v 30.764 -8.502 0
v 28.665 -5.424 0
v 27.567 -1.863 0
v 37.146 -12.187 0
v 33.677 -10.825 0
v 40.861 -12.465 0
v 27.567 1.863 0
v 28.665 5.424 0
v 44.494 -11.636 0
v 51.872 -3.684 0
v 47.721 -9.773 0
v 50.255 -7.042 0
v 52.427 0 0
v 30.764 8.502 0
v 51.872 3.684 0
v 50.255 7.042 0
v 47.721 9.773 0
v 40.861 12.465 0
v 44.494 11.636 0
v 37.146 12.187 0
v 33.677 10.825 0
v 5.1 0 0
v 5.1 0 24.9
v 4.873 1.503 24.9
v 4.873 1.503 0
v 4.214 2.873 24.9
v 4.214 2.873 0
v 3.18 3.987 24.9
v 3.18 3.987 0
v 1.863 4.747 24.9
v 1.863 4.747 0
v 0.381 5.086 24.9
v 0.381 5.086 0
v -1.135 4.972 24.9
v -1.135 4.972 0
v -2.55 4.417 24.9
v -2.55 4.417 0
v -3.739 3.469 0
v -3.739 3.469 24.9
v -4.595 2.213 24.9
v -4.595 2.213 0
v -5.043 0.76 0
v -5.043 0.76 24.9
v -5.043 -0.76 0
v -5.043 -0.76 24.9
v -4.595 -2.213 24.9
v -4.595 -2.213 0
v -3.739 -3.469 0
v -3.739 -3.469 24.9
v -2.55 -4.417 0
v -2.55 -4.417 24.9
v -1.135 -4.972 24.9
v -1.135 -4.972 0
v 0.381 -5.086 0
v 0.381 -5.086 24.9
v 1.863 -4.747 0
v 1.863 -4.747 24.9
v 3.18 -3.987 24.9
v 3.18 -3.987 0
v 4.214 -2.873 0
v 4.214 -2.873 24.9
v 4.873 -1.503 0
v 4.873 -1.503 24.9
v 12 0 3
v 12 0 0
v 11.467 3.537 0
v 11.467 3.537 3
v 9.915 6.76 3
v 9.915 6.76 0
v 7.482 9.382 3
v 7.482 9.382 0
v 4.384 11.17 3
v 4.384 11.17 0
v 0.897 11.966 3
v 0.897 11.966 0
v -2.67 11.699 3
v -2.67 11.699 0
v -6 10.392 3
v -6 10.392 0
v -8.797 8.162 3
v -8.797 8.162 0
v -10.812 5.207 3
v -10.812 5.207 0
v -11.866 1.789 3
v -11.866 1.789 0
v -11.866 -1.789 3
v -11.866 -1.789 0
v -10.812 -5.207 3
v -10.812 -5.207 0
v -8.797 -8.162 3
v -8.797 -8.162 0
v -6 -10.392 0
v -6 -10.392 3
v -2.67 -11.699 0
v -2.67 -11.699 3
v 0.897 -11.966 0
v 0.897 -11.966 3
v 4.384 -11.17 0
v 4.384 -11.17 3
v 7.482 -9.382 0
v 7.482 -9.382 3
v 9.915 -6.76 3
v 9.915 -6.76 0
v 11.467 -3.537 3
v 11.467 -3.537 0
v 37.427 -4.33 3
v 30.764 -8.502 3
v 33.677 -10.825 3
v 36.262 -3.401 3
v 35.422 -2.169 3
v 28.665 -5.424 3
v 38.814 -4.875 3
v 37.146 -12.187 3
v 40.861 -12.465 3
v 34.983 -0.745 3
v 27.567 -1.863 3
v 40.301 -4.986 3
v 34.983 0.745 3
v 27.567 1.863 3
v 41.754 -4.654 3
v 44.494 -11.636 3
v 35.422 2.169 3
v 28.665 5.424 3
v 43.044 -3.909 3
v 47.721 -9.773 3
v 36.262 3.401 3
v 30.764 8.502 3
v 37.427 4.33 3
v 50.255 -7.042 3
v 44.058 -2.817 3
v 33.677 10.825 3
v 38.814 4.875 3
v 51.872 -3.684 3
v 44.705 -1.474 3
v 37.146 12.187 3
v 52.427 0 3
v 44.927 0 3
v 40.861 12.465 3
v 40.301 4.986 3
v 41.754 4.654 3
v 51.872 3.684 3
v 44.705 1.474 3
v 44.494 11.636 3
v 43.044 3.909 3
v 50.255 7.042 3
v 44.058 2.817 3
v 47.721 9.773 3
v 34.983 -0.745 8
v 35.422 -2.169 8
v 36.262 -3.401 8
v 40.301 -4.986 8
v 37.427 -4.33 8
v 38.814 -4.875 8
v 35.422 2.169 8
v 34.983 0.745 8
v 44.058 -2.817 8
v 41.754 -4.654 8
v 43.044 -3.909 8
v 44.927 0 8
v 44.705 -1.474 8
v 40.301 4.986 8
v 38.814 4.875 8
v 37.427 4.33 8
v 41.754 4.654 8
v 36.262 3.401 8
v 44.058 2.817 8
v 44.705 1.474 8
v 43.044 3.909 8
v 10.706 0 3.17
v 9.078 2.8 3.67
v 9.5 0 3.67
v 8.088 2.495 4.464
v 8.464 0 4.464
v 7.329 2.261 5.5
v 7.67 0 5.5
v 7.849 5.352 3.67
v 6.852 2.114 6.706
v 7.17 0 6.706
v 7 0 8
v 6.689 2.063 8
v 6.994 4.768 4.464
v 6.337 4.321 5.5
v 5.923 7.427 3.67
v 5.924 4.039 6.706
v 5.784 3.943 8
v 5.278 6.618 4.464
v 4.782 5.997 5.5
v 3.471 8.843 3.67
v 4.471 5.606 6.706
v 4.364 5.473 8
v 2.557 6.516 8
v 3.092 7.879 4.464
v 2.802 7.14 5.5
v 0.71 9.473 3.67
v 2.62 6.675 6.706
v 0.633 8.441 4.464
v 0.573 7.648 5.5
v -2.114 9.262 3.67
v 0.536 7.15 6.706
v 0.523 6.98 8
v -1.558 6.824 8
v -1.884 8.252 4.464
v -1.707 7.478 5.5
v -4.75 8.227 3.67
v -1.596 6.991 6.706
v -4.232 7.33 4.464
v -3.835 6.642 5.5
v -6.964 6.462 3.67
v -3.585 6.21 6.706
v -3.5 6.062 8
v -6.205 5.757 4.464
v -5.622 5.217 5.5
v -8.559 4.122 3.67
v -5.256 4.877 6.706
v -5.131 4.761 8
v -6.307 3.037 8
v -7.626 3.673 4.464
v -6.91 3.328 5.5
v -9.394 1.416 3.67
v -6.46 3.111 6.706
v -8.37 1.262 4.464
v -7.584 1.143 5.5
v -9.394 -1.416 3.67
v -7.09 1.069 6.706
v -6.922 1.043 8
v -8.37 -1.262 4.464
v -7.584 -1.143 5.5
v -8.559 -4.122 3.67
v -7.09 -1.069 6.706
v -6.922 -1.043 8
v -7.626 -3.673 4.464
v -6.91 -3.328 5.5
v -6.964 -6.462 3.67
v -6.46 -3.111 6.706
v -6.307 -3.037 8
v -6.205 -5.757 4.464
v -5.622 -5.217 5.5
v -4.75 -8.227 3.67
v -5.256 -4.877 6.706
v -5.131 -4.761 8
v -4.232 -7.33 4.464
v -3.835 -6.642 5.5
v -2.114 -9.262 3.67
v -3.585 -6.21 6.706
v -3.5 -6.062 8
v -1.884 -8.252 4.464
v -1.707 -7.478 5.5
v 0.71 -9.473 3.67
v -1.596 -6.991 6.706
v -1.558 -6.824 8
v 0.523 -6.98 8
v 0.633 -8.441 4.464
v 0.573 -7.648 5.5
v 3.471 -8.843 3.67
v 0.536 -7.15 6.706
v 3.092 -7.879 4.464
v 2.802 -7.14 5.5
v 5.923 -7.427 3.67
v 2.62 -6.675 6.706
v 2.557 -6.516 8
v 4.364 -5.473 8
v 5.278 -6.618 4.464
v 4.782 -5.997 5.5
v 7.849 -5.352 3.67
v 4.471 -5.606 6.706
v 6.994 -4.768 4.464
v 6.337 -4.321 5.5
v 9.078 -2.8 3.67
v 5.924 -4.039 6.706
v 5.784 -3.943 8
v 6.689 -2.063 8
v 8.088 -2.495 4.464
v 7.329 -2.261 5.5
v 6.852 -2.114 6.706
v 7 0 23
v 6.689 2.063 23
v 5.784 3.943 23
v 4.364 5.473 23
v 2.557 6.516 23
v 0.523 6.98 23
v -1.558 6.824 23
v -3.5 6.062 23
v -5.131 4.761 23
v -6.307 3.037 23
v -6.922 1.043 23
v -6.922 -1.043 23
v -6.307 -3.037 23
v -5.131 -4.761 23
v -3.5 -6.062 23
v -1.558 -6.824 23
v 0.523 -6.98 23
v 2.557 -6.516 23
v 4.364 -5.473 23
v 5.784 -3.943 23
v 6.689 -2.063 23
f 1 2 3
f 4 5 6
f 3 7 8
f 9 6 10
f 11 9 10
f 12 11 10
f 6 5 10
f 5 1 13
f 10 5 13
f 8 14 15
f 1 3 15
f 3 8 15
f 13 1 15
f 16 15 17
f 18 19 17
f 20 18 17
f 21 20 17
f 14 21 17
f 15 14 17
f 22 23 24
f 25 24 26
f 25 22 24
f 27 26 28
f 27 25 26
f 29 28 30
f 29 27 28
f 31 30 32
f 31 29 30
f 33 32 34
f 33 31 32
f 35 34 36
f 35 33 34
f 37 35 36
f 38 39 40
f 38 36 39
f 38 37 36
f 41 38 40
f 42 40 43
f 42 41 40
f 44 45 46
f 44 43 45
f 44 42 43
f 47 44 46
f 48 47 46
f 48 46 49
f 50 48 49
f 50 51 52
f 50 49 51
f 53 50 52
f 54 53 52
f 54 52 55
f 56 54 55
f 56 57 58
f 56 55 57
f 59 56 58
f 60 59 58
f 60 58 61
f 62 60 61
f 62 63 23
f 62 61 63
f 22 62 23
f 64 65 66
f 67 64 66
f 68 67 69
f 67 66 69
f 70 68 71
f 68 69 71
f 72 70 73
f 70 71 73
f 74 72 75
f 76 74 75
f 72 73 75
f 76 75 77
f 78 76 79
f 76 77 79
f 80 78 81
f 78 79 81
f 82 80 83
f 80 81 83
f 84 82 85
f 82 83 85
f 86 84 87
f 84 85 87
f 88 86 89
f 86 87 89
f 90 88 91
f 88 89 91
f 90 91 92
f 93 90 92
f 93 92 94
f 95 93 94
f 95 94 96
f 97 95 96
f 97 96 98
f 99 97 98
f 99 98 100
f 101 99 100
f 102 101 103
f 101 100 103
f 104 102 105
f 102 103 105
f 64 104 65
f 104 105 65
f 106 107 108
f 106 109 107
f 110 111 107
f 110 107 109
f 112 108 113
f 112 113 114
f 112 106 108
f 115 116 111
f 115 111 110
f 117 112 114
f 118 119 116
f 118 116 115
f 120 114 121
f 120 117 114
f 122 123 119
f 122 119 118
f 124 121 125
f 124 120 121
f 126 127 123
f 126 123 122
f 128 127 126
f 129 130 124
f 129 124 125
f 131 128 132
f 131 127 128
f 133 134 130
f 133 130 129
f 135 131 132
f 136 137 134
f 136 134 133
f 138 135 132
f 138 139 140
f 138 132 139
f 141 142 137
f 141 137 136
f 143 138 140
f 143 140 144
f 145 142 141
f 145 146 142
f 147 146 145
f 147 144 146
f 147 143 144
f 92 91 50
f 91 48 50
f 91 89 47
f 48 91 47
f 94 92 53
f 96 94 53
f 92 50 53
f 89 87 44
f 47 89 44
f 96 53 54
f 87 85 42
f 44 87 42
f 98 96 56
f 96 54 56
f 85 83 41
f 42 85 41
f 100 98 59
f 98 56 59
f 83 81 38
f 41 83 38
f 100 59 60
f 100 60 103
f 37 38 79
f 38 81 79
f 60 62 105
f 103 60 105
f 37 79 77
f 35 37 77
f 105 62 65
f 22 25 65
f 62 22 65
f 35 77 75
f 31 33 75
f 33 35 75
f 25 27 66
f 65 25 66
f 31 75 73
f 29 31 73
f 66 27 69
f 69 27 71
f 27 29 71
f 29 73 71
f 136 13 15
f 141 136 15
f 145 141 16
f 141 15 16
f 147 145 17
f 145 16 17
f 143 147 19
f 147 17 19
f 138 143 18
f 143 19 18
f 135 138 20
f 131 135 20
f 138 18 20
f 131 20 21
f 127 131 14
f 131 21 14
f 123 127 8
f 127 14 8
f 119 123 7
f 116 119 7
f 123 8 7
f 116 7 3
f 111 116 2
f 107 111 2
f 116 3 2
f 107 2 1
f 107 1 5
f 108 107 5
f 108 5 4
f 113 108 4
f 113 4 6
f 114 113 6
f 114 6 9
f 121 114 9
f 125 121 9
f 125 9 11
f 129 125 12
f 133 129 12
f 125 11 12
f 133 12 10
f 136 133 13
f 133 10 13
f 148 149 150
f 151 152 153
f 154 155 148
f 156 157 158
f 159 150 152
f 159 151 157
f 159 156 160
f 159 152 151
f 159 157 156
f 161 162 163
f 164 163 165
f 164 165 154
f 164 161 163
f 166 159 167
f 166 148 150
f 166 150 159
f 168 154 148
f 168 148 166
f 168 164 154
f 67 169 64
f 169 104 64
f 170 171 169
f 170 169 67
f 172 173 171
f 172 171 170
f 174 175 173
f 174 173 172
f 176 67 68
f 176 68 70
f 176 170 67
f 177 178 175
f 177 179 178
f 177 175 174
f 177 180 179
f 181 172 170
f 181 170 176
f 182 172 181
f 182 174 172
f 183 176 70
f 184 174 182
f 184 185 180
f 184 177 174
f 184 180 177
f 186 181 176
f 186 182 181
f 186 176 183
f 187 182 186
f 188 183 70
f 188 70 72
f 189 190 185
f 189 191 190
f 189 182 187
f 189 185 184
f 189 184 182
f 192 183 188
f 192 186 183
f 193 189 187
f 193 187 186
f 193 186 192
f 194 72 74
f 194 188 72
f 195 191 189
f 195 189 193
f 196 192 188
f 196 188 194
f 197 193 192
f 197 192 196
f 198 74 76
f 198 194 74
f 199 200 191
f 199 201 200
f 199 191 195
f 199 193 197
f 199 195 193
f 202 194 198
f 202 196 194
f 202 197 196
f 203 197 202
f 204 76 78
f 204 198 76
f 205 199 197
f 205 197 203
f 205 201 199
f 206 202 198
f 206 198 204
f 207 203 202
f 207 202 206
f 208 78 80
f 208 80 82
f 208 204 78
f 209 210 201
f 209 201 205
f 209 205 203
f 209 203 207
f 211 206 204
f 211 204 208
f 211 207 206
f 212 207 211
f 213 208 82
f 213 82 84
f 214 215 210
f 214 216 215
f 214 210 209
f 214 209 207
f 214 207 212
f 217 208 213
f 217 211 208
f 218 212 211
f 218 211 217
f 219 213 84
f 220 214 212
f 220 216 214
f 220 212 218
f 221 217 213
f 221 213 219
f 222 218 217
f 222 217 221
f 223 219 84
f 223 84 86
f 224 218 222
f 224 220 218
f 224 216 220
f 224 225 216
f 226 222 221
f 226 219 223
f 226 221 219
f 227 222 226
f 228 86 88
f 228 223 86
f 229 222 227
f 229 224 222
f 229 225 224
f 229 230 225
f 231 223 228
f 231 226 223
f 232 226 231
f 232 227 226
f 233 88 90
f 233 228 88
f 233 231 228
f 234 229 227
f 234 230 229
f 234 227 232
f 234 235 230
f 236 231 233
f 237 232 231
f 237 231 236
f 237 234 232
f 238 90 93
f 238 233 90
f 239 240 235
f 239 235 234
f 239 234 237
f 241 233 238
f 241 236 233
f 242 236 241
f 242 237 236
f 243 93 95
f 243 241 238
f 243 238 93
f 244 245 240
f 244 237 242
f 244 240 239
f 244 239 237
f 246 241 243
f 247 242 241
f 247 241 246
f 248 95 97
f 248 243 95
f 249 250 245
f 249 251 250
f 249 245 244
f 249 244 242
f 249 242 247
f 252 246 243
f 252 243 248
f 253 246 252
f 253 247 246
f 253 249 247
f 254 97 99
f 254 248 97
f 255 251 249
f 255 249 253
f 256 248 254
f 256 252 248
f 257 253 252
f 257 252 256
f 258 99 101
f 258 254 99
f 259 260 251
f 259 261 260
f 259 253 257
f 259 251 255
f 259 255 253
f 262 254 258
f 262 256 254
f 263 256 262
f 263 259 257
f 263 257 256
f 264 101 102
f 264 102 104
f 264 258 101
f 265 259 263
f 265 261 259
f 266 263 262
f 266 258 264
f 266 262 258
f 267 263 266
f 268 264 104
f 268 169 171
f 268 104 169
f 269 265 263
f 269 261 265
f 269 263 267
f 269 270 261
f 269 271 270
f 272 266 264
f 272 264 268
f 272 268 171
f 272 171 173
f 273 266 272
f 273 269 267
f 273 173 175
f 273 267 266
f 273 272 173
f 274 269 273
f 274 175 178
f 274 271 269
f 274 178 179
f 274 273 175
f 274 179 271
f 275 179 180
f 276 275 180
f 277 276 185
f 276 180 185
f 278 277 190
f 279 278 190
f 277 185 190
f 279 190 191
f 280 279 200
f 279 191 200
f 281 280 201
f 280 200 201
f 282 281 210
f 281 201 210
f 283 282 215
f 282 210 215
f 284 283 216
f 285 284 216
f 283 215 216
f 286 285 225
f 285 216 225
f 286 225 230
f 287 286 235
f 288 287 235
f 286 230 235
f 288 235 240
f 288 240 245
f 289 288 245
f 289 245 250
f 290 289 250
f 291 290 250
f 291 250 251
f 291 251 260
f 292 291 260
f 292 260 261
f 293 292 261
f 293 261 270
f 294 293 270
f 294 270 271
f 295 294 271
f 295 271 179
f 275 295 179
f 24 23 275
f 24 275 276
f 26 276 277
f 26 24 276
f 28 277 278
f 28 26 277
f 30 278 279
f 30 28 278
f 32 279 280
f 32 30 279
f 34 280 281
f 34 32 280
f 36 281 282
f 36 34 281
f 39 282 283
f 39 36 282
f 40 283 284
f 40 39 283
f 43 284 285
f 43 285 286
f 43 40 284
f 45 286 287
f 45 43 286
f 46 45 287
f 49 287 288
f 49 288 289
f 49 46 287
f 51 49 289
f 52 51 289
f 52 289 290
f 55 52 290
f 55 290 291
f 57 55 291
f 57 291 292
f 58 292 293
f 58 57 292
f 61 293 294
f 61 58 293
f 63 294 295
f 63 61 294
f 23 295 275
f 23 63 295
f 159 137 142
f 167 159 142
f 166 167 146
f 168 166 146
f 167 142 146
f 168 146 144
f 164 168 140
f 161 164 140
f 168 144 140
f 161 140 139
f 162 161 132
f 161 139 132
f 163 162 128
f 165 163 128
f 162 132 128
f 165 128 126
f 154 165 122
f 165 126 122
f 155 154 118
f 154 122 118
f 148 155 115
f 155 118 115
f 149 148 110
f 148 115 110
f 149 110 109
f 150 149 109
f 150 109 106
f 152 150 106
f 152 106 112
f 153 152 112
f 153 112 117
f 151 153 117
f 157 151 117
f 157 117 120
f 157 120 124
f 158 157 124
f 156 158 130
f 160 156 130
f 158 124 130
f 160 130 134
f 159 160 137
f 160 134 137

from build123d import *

# Parameters (mm, degrees)
F0_R     = 7
F0_R_2   = 5.1
F1_DEPTH = 25
F0_R_3   = 12
F2_DEPTH = 3
F3_R     = 4.99999
F5_R     = 12.5
F6_DEPTH = 3
F7_R     = 5
F8_DEPTH = 5


# Not quite as in the source:
# - a fillet or chamfer that OpenCascade refuses, or shapes differently, is made with other operations: its cross-section is extruded or revolved along the edge and cut away or added
# - a fillet or chamfer is up to 0.001 mm smaller than in the source, because OpenCascade refuses the exact size


with BuildPart() as f1:
    # F0 (on Top) → F1 (new body)
    with BuildSketch(Plane.XY):
        Circle(F0_R)
        Circle(F0_R_2, mode=Mode.SUBTRACT)
    extrude(amount=F1_DEPTH)

    # F0 (on Top) → F2 (join)
    with BuildSketch(Plane.XY):
        Circle(F0_R_3)
        Circle(F0_R, mode=Mode.SUBTRACT)
    extrude(amount=F2_DEPTH)

    # F3 (radius 5 in the source; OpenCascade refuses exactly that, so slightly less here)
    f3_edges = [f1.edges().sort_by_distance(p)[0] for p in [
        (-7, 0, 3),
    ]]
    fillet(f3_edges, radius=F3_R)

    # F4: chamfer of 2 on 1 edges, made by hand

    # F4_s1 → F4_t2 (revolve, cut)
    with BuildSketch(Plane.XZ):
        Polygon((7, 23), (5, 25), (7, 25), align=None)
    revolve(axis=Axis((0, 0, 25), (0, 0, 1)), mode=Mode.SUBTRACT)


with BuildPart() as f6:
    # F5 (on Top) → F6 (new body)
    with BuildSketch(Plane.XY):
        with Locations((39.9270130853, 0)):
            Circle(F5_R)
    extrude(amount=F6_DEPTH)

    # F7 (on face) → F8 (join)
    with BuildSketch(Plane.XY.offset(3)):
        with Locations((39.9270130853, 0)):
            Circle(F7_R)
    extrude(amount=F8_DEPTH)


solid = Compound([f1.part, f6.part])
